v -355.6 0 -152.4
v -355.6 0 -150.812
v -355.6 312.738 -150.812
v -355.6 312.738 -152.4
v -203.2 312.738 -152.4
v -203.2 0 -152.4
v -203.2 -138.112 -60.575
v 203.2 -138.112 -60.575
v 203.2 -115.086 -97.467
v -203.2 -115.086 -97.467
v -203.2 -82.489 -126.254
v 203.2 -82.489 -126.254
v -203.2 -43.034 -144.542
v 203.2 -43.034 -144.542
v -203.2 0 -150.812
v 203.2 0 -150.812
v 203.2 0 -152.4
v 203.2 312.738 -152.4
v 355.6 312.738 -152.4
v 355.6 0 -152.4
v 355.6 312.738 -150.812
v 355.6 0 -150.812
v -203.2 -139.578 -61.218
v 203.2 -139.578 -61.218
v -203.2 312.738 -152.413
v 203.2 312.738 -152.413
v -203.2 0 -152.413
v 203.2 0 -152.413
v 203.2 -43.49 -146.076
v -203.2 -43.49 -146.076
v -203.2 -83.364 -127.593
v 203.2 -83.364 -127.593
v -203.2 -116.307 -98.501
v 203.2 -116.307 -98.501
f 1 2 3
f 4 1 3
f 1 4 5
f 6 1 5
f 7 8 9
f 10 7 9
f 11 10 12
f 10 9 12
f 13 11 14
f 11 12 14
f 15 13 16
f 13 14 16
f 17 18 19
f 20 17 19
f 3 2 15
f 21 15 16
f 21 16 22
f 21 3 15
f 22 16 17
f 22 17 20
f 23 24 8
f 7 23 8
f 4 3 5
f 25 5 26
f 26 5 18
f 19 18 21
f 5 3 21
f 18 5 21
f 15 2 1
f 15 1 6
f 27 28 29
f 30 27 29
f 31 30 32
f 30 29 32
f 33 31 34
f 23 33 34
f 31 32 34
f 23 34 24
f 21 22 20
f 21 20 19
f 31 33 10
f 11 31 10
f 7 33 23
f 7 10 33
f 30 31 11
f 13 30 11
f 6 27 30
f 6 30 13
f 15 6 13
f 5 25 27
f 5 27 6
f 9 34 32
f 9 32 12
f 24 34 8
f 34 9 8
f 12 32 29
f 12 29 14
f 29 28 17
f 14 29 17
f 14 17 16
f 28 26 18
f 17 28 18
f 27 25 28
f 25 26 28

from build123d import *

# Parameters (mm, degrees)
EXTRUDE_THIN1_DEPTH = 203.2
SKETCH2_W           = 711.2
SKETCH2_H           = 312.7375
BOSS_EXTRUDE1_DEPTH = 1.5875


with BuildPart() as part:
    # Sketch1 → Extrude-Thin1 (new body, symmetric)
    with BuildSketch(Plane(origin=(0, 0, 0), x_dir=(0, 0, -1), z_dir=(1, 0, 0))):
        with BuildLine():
            ThreePointArc((60.57513929, -138.1125), (126.253511536, -82.489156748), (150.8125, 0))
            Line((150.8125, 0), (150.8125, 312.7375))
            Line((150.8125, 312.7375), (152.4127, 312.7375))
            Line((152.4127, 312.7375), (152.4127, 0))
            ThreePointArc((152.4127, 0), (127.593127743, -83.364410117), (61.217873399, -139.577946316))
            Line((61.217873399, -139.577946316), (60.57513929, -138.1125))
        make_face()
    extrude(amount=EXTRUDE_THIN1_DEPTH, both=True)

    # Sketch2 → Boss-Extrude1 (add)
    with BuildSketch(Plane.XY.offset(-150.8125)):
        with Locations((0, 156.36875)):
            Rectangle(SKETCH2_W, SKETCH2_H)
    extrude(amount=-BOSS_EXTRUDE1_DEPTH)


solid = part.part
